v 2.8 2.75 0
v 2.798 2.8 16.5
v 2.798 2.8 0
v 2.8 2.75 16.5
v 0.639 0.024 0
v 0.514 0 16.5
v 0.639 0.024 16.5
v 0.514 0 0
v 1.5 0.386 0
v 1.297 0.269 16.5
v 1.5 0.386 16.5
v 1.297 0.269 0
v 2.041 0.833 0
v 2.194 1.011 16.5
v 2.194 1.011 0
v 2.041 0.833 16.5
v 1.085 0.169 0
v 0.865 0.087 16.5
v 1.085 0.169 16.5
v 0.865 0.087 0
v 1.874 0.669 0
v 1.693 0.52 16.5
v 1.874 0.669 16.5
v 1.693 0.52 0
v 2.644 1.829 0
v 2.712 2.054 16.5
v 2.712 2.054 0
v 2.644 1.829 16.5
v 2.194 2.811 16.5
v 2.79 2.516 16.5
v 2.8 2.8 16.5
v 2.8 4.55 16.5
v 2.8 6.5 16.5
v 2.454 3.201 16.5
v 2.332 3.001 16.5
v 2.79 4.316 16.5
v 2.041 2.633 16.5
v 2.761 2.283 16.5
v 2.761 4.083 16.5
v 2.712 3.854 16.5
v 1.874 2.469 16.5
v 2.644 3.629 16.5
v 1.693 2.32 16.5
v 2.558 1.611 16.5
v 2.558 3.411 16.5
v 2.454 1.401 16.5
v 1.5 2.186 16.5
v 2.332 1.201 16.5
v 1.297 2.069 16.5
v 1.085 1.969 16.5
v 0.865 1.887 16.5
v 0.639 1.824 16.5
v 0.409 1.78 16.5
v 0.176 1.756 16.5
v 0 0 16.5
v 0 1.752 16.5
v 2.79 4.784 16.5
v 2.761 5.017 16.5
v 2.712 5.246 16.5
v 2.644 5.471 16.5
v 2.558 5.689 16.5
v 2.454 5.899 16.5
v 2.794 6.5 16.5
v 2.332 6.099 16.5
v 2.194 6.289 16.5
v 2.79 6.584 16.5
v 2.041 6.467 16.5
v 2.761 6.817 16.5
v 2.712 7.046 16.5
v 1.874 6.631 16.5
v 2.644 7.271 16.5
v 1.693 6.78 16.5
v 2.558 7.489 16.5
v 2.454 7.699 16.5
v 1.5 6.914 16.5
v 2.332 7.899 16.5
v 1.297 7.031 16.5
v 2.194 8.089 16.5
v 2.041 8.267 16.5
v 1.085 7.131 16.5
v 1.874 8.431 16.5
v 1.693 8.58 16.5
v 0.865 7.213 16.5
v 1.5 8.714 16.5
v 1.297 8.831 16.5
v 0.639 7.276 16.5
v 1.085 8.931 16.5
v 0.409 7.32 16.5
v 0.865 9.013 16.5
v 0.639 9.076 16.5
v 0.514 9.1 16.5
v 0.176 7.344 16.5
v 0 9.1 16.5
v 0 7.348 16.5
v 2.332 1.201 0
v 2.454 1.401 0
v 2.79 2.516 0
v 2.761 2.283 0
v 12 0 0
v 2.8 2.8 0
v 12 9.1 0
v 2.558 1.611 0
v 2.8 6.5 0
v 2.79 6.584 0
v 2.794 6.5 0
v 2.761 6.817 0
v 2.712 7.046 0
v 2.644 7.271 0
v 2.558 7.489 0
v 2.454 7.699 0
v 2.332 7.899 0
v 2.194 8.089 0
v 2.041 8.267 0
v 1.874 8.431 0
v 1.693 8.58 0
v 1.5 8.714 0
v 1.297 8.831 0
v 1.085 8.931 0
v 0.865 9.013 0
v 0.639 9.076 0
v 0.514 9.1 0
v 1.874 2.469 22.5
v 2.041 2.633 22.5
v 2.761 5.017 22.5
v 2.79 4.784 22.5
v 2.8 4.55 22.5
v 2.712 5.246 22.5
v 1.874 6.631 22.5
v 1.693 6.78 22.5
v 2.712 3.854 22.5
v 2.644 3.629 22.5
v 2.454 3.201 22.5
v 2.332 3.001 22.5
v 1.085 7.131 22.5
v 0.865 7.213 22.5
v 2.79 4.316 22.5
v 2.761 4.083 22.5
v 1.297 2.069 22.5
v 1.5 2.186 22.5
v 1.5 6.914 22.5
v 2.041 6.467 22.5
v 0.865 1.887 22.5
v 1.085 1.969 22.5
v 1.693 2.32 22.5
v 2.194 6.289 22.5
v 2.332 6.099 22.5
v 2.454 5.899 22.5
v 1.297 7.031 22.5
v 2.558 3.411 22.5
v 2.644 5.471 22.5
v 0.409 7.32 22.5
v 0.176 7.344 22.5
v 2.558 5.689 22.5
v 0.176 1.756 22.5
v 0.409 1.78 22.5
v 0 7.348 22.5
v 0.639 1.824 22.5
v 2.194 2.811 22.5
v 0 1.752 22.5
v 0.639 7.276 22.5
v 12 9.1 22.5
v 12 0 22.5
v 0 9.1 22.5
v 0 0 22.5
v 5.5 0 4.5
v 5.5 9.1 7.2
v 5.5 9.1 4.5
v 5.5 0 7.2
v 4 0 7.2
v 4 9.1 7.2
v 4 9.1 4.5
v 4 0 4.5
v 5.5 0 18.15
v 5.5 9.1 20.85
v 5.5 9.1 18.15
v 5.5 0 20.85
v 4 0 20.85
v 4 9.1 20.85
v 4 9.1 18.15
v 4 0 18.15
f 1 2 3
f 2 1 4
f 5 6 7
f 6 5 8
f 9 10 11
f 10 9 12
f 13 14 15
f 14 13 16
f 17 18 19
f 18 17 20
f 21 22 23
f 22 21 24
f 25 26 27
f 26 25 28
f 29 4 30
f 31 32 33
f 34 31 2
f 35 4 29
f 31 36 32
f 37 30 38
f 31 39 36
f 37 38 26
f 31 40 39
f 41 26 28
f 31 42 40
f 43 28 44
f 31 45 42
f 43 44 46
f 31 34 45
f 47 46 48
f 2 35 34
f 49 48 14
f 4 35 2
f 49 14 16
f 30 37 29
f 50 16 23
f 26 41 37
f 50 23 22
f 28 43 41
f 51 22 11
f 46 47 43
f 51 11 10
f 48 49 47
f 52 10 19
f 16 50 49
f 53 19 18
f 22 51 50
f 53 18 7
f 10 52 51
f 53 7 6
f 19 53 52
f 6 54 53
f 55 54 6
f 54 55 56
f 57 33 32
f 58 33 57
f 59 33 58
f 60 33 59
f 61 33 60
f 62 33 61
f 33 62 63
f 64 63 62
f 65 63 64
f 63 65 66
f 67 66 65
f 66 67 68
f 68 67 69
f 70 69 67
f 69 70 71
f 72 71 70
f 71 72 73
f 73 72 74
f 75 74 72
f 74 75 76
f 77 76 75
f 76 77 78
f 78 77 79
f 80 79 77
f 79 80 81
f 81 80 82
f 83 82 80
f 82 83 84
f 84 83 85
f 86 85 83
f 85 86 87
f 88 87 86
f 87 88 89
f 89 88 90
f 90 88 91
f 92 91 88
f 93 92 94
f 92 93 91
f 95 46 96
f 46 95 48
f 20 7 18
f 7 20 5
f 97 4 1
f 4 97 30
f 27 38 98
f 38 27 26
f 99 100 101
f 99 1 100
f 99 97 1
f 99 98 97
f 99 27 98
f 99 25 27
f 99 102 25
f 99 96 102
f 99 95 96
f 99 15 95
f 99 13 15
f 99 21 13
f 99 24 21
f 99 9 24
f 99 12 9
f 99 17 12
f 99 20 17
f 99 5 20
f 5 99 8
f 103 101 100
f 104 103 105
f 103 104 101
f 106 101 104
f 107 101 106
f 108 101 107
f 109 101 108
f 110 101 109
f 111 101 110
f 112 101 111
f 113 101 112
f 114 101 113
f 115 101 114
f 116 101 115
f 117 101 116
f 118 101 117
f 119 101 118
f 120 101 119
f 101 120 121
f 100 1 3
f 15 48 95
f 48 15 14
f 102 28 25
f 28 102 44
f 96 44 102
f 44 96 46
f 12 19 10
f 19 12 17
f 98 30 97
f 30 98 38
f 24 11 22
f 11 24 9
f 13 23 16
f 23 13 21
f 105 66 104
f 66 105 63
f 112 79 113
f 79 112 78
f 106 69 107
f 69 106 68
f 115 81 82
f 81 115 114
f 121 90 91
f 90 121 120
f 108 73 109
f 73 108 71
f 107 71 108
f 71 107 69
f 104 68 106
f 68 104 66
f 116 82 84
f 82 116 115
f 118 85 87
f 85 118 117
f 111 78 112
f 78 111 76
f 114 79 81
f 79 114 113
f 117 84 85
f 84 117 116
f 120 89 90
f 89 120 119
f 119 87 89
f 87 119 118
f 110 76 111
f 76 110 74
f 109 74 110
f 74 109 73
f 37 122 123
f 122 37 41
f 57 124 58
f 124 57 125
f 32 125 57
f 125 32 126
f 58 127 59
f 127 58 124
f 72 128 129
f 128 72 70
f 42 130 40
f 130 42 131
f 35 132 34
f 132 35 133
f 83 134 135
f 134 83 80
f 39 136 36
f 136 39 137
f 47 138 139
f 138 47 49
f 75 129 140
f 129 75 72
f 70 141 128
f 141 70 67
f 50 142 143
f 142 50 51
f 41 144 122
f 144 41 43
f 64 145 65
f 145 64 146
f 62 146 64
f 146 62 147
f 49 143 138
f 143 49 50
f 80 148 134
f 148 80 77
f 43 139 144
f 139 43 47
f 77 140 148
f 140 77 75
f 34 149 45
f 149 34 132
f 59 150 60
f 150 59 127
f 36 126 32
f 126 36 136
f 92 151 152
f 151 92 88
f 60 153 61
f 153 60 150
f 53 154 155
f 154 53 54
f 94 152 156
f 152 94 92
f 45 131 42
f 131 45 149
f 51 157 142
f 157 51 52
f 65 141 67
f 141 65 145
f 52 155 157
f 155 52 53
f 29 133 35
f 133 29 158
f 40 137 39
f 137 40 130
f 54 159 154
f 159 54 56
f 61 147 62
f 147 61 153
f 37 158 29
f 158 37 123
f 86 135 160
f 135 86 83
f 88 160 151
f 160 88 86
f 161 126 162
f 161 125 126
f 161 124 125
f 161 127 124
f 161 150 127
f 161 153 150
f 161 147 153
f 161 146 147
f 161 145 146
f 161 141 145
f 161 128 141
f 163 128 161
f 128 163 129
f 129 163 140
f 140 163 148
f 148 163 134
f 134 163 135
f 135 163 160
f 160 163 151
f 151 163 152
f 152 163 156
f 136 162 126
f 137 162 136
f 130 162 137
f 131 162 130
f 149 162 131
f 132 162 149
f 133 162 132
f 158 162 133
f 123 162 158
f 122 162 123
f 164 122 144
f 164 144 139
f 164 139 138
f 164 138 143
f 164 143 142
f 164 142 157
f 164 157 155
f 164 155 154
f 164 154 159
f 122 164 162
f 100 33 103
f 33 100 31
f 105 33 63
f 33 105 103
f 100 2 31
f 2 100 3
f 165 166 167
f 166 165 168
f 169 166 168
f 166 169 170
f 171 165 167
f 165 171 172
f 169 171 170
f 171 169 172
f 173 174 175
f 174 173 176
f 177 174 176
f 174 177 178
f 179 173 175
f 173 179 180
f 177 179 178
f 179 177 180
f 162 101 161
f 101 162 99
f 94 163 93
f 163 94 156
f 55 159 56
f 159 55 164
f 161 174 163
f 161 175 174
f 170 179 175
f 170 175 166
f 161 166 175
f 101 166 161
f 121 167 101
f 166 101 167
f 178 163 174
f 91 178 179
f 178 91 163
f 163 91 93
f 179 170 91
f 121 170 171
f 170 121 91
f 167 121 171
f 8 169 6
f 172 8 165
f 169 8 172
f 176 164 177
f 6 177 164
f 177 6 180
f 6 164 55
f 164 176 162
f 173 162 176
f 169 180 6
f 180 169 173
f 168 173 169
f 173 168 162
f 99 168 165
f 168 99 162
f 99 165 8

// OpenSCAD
// created by IndiePandaaaaa | Lukas

THICKNESS = 3;
TOLERANCE = 0.1;
CT_WIDTH = 2.5 + 0.2; // CT_WIDTH = cable tie width
$fn = 75;

USBPLUG_WIDTH = 9.1;
USBPLUG_DEPTH = 5.5;
USBPLUG_HEIGHT = 16.5;
USBPLUG_CABLE_HEIGHT = 6;

SOCKET_DEPTH = 12;

USBCABLE_SHAPE = "ROUNDED"; // "SQUARE" || "ROUNDED"  // fixme: implement square|rounded

module cable_model(width, depth, height, cable_height, tolerance = 0.1) {
    translate([- (depth + tolerance) / 2, 0, 0])
        union() {
            translate([0, (depth + tolerance) / 2, 0])
                cube([depth + tolerance, width - depth + tolerance, height]);

            translate([(depth + tolerance) / 2, (depth) / 2, 0]) {
                cylinder(h = height, d = depth + tolerance);
                translate([0, width - (depth), 0]) cylinder(h = height, d = depth + tolerance);

                // cable
                translate([0, (width - (depth)) / 2, 0]) cylinder(h = height + cable_height, d = depth + tolerance);
            }
        }
}

difference() {
    cube([SOCKET_DEPTH, USBPLUG_WIDTH, USBPLUG_HEIGHT + USBPLUG_CABLE_HEIGHT]);
    cable_model(USBPLUG_WIDTH, USBPLUG_DEPTH, USBPLUG_HEIGHT, USBPLUG_CABLE_HEIGHT);

    translate([SOCKET_DEPTH / 3, - USBPLUG_WIDTH / 2, 0]) {
        translate([0, 0, (USBPLUG_HEIGHT + USBPLUG_CABLE_HEIGHT) / 5])
            cube([1.5, USBPLUG_WIDTH * 2, CT_WIDTH]);
        translate([0, 0, USBPLUG_HEIGHT + (USBPLUG_CABLE_HEIGHT - CT_WIDTH) / 2])
            cube([1.5, USBPLUG_WIDTH * 2, CT_WIDTH]);
    }
}
